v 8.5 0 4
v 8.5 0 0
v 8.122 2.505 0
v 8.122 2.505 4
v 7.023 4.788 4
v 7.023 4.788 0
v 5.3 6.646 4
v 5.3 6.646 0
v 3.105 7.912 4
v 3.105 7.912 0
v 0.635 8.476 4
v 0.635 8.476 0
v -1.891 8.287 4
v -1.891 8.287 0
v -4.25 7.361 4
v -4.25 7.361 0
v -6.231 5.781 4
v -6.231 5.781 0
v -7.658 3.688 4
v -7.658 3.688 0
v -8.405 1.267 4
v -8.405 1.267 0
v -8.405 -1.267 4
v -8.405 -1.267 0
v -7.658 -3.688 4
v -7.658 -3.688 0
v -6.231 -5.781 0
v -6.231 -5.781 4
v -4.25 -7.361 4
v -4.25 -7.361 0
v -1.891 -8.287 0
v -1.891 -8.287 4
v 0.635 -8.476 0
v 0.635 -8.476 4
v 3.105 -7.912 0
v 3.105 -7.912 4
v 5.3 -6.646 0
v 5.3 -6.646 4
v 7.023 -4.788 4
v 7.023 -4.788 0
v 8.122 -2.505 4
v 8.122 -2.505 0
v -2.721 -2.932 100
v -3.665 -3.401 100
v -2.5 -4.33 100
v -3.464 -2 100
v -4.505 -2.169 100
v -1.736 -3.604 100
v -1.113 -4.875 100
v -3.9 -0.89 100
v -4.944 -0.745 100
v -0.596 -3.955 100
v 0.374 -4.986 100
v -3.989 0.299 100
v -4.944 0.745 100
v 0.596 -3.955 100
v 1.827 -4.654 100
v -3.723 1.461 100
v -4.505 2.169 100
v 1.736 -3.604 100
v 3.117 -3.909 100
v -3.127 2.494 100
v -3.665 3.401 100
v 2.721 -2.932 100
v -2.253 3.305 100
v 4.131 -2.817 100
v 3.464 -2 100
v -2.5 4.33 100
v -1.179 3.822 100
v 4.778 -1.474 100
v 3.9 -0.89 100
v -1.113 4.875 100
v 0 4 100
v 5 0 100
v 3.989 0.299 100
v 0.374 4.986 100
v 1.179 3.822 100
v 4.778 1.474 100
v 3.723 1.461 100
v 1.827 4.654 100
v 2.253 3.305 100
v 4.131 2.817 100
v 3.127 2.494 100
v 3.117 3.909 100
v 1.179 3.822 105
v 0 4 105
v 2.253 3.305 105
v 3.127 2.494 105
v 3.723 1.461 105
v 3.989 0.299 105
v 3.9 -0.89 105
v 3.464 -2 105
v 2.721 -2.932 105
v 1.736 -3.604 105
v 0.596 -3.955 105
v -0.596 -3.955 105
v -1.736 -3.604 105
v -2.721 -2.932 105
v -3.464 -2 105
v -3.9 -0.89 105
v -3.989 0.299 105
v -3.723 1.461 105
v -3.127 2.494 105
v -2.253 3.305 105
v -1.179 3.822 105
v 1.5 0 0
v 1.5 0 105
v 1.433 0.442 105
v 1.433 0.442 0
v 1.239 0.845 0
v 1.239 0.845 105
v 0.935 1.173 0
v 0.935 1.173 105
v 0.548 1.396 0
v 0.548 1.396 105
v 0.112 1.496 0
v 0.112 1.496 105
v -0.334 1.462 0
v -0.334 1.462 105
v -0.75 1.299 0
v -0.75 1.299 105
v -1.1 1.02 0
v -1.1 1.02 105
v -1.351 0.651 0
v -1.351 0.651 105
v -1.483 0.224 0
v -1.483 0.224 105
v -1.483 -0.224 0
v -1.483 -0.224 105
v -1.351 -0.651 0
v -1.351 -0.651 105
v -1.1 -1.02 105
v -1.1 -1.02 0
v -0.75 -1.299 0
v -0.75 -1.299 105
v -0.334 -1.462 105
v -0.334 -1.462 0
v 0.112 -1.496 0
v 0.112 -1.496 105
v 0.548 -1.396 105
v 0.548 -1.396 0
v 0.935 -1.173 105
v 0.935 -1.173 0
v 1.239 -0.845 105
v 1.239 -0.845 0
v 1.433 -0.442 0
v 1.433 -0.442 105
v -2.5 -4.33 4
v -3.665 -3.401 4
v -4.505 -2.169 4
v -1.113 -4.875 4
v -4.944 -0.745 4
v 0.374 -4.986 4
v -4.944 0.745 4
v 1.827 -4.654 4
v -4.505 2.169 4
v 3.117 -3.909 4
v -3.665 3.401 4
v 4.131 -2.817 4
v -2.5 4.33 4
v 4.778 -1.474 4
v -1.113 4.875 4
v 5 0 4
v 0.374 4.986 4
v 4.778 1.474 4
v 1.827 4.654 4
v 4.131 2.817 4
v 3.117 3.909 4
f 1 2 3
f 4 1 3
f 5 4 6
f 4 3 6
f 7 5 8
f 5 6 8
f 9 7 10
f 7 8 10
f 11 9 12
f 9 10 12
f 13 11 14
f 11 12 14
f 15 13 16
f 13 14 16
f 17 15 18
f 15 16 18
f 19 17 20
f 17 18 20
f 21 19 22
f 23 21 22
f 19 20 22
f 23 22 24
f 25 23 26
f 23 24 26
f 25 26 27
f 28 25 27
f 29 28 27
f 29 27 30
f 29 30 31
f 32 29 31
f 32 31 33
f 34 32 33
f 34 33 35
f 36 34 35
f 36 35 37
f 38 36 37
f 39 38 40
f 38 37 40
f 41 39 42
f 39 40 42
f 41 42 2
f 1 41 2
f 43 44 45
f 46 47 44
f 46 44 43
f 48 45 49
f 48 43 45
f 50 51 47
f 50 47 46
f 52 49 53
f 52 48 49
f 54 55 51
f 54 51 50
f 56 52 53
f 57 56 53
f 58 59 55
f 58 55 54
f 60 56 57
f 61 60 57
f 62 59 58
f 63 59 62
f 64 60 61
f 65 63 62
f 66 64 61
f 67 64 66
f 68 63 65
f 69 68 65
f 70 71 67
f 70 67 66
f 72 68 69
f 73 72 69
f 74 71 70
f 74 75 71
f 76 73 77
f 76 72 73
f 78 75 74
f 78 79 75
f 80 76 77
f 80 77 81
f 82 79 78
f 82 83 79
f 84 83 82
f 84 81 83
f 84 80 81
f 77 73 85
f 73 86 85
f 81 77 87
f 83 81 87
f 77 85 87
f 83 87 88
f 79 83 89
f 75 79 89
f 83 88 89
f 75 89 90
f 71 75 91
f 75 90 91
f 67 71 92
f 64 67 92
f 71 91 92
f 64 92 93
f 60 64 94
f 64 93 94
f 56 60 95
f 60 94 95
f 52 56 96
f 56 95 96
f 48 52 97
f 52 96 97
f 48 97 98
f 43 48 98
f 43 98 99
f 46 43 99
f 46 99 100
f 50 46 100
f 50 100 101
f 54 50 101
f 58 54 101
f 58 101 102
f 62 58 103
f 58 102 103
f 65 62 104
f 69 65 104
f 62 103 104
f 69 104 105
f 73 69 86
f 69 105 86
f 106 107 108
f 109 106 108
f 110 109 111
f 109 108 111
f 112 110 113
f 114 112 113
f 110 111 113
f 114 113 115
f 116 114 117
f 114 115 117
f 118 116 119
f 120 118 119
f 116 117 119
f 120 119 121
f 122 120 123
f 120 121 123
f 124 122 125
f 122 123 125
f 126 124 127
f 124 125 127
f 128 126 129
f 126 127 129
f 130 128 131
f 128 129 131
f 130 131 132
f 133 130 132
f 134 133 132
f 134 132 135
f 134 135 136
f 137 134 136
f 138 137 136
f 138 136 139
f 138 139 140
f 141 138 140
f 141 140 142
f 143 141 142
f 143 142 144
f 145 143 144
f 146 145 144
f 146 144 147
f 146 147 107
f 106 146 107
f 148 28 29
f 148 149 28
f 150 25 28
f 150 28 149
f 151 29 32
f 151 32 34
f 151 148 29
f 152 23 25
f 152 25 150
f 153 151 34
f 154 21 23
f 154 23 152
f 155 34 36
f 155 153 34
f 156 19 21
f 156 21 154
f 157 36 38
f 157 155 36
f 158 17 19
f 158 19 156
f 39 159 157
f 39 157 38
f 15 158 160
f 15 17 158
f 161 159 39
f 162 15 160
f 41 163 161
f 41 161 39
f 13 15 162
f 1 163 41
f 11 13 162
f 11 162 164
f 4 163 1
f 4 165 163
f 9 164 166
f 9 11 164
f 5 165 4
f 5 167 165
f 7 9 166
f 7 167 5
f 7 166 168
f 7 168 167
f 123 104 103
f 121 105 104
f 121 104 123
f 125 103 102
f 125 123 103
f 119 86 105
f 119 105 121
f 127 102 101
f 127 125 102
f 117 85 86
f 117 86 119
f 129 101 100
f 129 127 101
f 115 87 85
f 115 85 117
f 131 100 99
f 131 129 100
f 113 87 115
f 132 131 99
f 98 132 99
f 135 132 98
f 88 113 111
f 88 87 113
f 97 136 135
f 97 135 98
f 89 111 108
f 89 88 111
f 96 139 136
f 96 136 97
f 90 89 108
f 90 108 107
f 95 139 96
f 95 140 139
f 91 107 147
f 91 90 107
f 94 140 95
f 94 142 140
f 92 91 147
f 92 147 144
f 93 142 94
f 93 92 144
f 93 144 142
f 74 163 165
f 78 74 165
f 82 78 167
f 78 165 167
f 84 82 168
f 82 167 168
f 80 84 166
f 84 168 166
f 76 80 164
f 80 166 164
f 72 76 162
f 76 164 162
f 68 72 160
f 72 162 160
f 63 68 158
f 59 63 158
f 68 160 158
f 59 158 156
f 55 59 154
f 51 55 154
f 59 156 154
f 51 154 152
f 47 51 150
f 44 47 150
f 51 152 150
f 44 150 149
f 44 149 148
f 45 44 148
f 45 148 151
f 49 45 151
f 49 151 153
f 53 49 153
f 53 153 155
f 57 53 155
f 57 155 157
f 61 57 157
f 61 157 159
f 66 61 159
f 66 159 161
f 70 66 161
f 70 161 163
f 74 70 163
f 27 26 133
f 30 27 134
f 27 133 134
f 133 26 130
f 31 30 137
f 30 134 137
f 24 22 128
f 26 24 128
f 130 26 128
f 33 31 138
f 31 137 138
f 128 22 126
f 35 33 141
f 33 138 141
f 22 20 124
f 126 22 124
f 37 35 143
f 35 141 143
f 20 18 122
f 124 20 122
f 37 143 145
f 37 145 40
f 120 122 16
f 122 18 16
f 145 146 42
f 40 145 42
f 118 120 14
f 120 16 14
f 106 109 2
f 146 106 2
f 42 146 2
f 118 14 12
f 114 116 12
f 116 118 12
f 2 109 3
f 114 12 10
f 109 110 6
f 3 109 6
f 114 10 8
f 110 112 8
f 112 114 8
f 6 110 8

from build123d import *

# Parameters (mm, degrees)
F0_R     = 8.5
F1_DEPTH = 4
F2_R     = 5
F3_DEPTH = 100
F4_W     = 4
F4_H     = 5
F6_R     = 1.5
F7_DEPTH = 112


with BuildPart() as f1:
    # F0 (on Top) → F1 (new body)
    with BuildSketch(Plane.XY):
        Circle(F0_R)
    extrude(amount=F1_DEPTH)

    # F2 (on Top) → F3 (join)
    with BuildSketch(Plane.XY):
        Circle(F2_R)
    extrude(amount=F3_DEPTH)

    # F4 (on Right) → F5 (revolve)
    with BuildSketch(Plane.YZ):
        with Locations((2, 102.5)):
            Rectangle(F4_W, F4_H)
    revolve(axis=Axis((0, 0, 102.5), (0, 0, -1)))

    # F6 (on face) → F7 (cut)
    with BuildSketch(Plane.XY.offset(105)):
        Circle(F6_R)
    extrude(amount=-F7_DEPTH, mode=Mode.SUBTRACT)


solid = f1.part
